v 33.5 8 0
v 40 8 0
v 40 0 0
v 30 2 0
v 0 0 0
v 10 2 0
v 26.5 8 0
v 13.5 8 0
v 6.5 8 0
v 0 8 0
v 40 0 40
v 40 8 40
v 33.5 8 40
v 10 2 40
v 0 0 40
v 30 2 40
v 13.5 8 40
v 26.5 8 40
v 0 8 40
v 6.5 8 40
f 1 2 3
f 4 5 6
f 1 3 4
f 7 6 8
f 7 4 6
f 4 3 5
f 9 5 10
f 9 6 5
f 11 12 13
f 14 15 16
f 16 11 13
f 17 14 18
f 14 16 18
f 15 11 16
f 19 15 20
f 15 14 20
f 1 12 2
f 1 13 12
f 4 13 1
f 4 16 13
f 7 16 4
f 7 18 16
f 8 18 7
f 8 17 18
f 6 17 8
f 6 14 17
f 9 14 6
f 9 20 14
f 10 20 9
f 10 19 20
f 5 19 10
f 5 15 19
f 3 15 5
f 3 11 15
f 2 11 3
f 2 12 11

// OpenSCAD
$fn = 32;

// ----------------------------------------------------------------------
// V guide rail: doublev, 40 mm wide
// ----------------------------------------------------------------------

// --- parameters (mm) ---
rail_w = 40;              // rail width, X
base_t = 8;               // base plate thickness
v_depth = 6;              // V feature depth / height
v_half_w = 7;             // half width of the V at the base face
plate_t = 40;             // rail length, Z (the extrusion height)
groove_off = 10;          // offset of each groove from the centreline

centre_x = rail_w / 2;  // rail centreline
groove_a = centre_x - groove_off;  // axis of the first groove
groove_b = centre_x + groove_off;  // axis of the second groove

profile = [[0, 0], [40, 0], [40, 8], [33.5, 8], [30, 2], [26.5, 8], [13.5, 8], [10, 2], [6.5, 8], [0, 8]];  // primary outline, 10 points, counter clockwise

// --- the one profile operation ---
linear_extrude(height = plate_t) polygon(points = profile);
